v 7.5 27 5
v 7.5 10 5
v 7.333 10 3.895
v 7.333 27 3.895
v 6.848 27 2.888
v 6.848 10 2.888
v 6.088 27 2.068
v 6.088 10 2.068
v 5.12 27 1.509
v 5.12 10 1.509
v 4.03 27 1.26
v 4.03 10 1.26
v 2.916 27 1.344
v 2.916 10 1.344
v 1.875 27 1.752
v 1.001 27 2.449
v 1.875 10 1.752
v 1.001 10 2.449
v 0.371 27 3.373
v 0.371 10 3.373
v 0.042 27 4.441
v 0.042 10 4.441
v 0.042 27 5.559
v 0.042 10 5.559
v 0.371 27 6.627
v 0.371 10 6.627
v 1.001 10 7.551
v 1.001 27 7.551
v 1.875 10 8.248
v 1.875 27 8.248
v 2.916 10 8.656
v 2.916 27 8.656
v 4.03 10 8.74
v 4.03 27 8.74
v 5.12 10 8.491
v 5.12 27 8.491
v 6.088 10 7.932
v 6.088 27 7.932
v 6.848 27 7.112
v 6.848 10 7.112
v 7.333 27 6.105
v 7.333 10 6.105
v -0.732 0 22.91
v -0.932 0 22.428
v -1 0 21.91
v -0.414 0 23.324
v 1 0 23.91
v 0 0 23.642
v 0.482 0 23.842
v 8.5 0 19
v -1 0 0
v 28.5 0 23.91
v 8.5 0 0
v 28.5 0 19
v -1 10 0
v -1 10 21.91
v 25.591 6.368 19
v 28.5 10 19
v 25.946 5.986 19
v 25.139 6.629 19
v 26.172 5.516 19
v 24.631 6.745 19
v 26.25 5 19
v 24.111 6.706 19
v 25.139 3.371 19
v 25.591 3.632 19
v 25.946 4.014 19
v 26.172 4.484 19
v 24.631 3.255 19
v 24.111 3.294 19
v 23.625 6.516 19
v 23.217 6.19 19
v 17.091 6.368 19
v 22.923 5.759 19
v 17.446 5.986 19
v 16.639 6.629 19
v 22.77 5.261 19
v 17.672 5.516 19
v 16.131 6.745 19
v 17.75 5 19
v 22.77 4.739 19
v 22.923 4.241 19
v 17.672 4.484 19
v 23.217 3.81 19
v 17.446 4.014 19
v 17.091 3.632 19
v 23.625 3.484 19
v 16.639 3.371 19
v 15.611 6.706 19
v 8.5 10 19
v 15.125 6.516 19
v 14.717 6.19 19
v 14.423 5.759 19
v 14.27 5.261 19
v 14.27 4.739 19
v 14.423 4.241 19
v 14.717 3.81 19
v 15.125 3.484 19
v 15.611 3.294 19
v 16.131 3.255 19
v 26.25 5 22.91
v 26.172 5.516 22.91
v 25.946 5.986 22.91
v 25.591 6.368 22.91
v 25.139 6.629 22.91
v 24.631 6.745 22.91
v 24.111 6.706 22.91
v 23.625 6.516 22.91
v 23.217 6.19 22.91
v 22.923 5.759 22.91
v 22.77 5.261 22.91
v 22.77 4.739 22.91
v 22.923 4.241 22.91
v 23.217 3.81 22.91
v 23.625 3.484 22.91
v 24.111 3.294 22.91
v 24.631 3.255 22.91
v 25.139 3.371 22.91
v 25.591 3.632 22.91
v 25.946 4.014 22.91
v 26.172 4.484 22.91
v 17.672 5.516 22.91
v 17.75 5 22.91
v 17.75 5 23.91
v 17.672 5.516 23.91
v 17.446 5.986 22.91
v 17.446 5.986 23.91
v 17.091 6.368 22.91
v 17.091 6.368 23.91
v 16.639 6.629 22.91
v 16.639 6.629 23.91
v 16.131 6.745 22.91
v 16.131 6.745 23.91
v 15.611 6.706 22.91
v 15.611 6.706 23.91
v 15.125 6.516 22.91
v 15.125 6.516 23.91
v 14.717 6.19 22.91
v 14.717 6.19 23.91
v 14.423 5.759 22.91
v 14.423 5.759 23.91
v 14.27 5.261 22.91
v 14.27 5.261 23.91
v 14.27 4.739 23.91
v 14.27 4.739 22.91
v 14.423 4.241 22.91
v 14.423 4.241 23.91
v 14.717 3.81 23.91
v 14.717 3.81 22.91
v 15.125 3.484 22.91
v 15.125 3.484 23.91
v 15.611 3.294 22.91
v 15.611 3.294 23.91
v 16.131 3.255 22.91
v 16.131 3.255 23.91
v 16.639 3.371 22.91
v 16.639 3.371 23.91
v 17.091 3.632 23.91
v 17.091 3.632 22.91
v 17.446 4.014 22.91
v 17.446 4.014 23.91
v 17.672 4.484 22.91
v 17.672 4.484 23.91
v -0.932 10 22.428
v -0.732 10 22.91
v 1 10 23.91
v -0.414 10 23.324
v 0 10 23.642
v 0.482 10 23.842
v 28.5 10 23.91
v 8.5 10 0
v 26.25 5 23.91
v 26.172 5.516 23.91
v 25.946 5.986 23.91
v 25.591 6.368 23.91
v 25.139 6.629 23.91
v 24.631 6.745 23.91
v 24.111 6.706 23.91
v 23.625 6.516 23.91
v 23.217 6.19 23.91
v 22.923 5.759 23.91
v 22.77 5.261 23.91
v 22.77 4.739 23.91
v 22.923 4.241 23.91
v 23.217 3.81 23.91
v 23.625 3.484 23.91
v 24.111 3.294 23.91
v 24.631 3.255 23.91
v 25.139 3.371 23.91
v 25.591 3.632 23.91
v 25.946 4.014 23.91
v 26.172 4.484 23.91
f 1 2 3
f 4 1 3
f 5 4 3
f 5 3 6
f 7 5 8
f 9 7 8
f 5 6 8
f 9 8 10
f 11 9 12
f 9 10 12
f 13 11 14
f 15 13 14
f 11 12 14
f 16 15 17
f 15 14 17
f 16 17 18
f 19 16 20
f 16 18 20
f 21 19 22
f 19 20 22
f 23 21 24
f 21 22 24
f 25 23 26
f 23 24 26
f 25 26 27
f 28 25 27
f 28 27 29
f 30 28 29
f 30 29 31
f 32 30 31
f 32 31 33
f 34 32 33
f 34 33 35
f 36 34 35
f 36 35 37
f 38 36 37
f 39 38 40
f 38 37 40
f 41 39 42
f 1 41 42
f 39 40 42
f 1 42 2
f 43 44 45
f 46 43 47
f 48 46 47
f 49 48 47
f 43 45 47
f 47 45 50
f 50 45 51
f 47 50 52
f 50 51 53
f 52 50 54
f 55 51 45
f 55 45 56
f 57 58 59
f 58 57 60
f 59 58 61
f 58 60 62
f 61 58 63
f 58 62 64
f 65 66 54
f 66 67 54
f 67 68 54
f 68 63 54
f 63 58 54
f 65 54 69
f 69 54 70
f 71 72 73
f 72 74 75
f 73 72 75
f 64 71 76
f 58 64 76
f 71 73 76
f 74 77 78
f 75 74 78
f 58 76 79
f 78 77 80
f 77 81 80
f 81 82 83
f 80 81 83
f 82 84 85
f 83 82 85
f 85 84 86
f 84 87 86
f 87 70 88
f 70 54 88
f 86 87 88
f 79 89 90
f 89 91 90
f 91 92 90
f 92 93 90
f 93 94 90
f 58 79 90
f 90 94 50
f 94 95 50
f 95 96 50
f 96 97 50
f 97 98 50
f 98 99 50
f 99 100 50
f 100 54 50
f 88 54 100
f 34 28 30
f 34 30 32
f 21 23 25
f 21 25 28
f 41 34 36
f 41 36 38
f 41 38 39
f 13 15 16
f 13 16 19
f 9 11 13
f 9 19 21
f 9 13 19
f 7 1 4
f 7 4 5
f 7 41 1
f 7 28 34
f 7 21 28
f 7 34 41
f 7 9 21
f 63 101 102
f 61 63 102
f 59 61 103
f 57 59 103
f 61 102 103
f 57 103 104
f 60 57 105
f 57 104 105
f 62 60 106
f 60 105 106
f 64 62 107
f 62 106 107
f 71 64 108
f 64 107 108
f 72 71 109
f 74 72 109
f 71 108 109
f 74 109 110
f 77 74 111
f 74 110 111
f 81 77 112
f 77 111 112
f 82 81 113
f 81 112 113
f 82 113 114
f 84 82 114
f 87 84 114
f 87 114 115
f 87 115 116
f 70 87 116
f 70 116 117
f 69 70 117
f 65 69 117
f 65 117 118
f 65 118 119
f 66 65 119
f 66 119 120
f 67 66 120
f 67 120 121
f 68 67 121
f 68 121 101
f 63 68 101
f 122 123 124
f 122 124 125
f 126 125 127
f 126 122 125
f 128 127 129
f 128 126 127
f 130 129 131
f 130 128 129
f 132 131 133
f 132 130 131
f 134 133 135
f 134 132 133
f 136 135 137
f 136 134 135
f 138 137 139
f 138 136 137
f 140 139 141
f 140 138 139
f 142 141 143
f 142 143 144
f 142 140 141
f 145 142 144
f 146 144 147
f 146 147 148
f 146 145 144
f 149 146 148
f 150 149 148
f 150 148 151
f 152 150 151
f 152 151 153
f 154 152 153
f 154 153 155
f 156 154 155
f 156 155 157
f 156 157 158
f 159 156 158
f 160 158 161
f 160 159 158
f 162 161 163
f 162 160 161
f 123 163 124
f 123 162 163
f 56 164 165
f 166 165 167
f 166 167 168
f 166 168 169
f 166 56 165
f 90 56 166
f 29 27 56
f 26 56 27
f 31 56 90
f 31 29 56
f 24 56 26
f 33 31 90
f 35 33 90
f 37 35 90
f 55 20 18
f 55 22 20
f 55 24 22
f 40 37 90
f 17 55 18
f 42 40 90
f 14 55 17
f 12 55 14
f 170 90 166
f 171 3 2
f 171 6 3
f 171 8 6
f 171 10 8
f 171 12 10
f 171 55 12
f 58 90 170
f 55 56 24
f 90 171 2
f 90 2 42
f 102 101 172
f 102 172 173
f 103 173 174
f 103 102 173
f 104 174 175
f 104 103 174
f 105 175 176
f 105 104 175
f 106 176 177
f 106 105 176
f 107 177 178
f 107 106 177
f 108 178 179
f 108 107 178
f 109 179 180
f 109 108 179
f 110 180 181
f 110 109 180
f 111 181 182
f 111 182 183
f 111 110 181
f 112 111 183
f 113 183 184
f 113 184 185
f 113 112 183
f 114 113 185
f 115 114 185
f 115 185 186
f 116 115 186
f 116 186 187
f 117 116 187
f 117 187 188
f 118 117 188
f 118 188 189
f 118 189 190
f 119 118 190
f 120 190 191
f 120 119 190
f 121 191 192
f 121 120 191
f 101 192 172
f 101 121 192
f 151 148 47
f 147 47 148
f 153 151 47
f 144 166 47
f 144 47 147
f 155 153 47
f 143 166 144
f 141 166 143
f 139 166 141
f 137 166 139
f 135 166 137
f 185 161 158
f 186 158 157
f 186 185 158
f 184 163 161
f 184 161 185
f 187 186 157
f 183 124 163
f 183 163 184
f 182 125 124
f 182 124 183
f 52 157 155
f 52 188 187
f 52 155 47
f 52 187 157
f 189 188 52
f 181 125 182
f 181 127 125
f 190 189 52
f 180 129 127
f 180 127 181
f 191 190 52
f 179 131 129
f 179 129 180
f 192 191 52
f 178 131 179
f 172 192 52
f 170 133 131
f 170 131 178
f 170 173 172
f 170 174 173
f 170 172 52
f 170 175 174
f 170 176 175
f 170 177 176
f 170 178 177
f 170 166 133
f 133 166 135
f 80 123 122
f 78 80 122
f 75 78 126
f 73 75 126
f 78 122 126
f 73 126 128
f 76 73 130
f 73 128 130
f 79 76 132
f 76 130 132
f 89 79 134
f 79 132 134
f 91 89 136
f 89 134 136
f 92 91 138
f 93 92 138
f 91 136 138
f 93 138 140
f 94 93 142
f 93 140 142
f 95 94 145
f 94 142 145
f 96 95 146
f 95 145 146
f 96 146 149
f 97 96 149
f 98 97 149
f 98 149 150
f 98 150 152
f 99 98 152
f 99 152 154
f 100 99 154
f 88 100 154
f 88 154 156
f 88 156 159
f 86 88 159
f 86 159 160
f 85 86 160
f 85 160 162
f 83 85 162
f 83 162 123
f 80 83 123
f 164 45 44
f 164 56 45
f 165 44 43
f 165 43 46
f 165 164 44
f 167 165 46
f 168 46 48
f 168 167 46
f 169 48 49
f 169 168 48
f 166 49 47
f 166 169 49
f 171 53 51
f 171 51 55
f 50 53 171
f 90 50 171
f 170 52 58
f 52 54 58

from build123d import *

# Parameters (mm, degrees)
SKETCH1_W           = 12.5
SKETCH1_H           = 10
BOSS_EXTRUDE1_DEPTH = 10
SKETCH2_W           = 10
SKETCH2_H           = 10
BOSS_EXTRUDE2_DEPTH = 5
SKETCH3_R           = 3.75
BOSS_EXTRUDE3_DEPTH = 17
SKETCH4_W           = 4
SKETCH4_H           = 10
CUT_EXTRUDE1_DEPTH  = 11
SKETCH5_W           = 9.5
SKETCH5_H           = 10
BOSS_EXTRUDE4_DEPTH = 12.5
SKETCH6_W           = 5
SKETCH6_H           = 10
BOSS_EXTRUDE5_DEPTH = 30
SKETCH7_R           = 1.75
CUT_EXTRUDE2_DEPTH  = 23.5
SKETCH8_W           = 30
SKETCH8_H           = 5
CUT_EXTRUDE4_DEPTH  = 10
SKETCH10_W          = 9.5
SKETCH10_H          = 10
CUT_EXTRUDE6_DEPTH  = 3.49
SKETCH11_W          = 9.5
SKETCH11_H          = 10
BOSS_EXTRUDE6_DEPTH = 3.9
SKETCH12_W          = 4
SKETCH12_H          = 10
BOSS_EXTRUDE7_DEPTH = 20
SKETCH13_W          = 20
SKETCH13_H          = 0.09
CUT_EXTRUDE7_DEPTH  = 28
SKETCH14_R          = 1.75
CUT_EXTRUDE8_DEPTH  = 23.91
SKETCH15_W          = 29.5
SKETCH15_H          = 10
SKETCH15_R          = 1.75
BOSS_EXTRUDE8_DEPTH = 1
FILLET1_R           = 2


with BuildPart() as part:
    # Sketch1 → Boss-Extrude1 (new body)
    with BuildSketch(Plane.XY):
        with Locations((6.25, 5)):
            Rectangle(SKETCH1_W, SKETCH1_H)
    extrude(amount=BOSS_EXTRUDE1_DEPTH)

    # Sketch2 → Boss-Extrude2 (add)
    with BuildSketch(Plane.ZY):
        with Locations((5, 5)):
            Rectangle(SKETCH2_W, SKETCH2_H)
    extrude(amount=BOSS_EXTRUDE2_DEPTH)

    # Sketch3 → Boss-Extrude3 (add)
    with BuildSketch(Plane(origin=(0, 10, 0), x_dir=(1, 0, 0), z_dir=(0, 1, 0))):
        with Locations((3.75, -5)):
            Circle(SKETCH3_R)
    extrude(amount=BOSS_EXTRUDE3_DEPTH)

    # Sketch4 → Cut-Extrude1 (cut, through all)
    with BuildSketch(Plane(origin=(0, 10, 0), x_dir=(1, 0, 0), z_dir=(0, 1, 0))):
        with Locations((10.5, -5)):
            Rectangle(SKETCH4_W, SKETCH4_H)
        with Locations((-3, -5)):
            Rectangle(SKETCH4_W, SKETCH4_H)
    extrude(amount=-CUT_EXTRUDE1_DEPTH, mode=Mode.SUBTRACT)

    # Sketch5 → Boss-Extrude4 (add)
    with BuildSketch(Plane.XY.offset(10)):
        with Locations((3.75, 5)):
            Rectangle(SKETCH5_W, SKETCH5_H)
    extrude(amount=BOSS_EXTRUDE4_DEPTH)

    # Sketch6 → Boss-Extrude5 (add)
    with BuildSketch(Plane(origin=(8.5, 0, 0), x_dir=(0, 0, -1), z_dir=(1, 0, 0))):
        with Locations((-20, 5)):
            Rectangle(SKETCH6_W, SKETCH6_H)
    extrude(amount=BOSS_EXTRUDE5_DEPTH)

    # Sketch7 → Cut-Extrude2 (cut, through all)
    with BuildSketch(Plane.XY.offset(22.5)):
        with Locations((22.5, 5)):
            Circle(SKETCH7_R)
        with Locations((33.5, 5)):
            Circle(SKETCH7_R)
    extrude(amount=-CUT_EXTRUDE2_DEPTH, mode=Mode.SUBTRACT)

    # Sketch8 → Cut-Extrude4 (cut)
    with BuildSketch(Plane(origin=(0, 10, 0), x_dir=(1, 0, 0), z_dir=(0, 1, 0))):
        with Locations((23.5, -20)):
            Rectangle(SKETCH8_W, SKETCH8_H)
    extrude(amount=-CUT_EXTRUDE4_DEPTH, mode=Mode.SUBTRACT)

    # Sketch10 → Cut-Extrude6 (cut)
    with BuildSketch(Plane.XY.offset(22.5)):
        with Locations((3.75, 5)):
            Rectangle(SKETCH10_W, SKETCH10_H)
    extrude(amount=-CUT_EXTRUDE6_DEPTH, mode=Mode.SUBTRACT)

    # Sketch11 → Boss-Extrude6 (add)
    with BuildSketch(Plane.XY.offset(19.01)):
        with Locations((3.75, 5)):
            Rectangle(SKETCH11_W, SKETCH11_H)
    extrude(amount=BOSS_EXTRUDE6_DEPTH)

    # Sketch12 → Boss-Extrude7 (add)
    with BuildSketch(Plane(origin=(8.5, 0, 0), x_dir=(0, 0, -1), z_dir=(1, 0, 0))):
        with Locations((-20.91, 5)):
            Rectangle(SKETCH12_W, SKETCH12_H)
    extrude(amount=BOSS_EXTRUDE7_DEPTH)

    # Sketch13 → Cut-Extrude7 (cut, through all)
    with BuildSketch(Plane(origin=(0, 0, 0), x_dir=(-1, 0, 0), z_dir=(0, -1, 0))):
        with Locations((-18.5, -18.955)):
            Rectangle(SKETCH13_W, SKETCH13_H)
    extrude(amount=-CUT_EXTRUDE7_DEPTH, mode=Mode.SUBTRACT)

    # Sketch14 → Cut-Extrude8 (cut, through all)
    with BuildSketch(Plane.XY.offset(22.91)):
        with Locations((16, 5)):
            Circle(SKETCH14_R)
        with Locations((24.5, 5)):
            Circle(SKETCH14_R)
    extrude(amount=-CUT_EXTRUDE8_DEPTH, mode=Mode.SUBTRACT)

    # Sketch15 → Boss-Extrude8 (add)
    with BuildSketch(Plane.XY.offset(22.91)):
        with Locations((13.75, 5)):
            Rectangle(SKETCH15_W, SKETCH15_H)
        with Locations((24.5, 5)):
            Circle(SKETCH15_R, mode=Mode.SUBTRACT)
        with Locations((16, 5)):
            Circle(SKETCH15_R, mode=Mode.SUBTRACT)
    extrude(amount=BOSS_EXTRUDE8_DEPTH)

    # Fillet1
    fillet1_edges = [part.edges().sort_by_distance(p)[0] for p in [
        (-1, 5, 23.91),
    ]]
    fillet(fillet1_edges, radius=FILLET1_R)


solid = part.part
